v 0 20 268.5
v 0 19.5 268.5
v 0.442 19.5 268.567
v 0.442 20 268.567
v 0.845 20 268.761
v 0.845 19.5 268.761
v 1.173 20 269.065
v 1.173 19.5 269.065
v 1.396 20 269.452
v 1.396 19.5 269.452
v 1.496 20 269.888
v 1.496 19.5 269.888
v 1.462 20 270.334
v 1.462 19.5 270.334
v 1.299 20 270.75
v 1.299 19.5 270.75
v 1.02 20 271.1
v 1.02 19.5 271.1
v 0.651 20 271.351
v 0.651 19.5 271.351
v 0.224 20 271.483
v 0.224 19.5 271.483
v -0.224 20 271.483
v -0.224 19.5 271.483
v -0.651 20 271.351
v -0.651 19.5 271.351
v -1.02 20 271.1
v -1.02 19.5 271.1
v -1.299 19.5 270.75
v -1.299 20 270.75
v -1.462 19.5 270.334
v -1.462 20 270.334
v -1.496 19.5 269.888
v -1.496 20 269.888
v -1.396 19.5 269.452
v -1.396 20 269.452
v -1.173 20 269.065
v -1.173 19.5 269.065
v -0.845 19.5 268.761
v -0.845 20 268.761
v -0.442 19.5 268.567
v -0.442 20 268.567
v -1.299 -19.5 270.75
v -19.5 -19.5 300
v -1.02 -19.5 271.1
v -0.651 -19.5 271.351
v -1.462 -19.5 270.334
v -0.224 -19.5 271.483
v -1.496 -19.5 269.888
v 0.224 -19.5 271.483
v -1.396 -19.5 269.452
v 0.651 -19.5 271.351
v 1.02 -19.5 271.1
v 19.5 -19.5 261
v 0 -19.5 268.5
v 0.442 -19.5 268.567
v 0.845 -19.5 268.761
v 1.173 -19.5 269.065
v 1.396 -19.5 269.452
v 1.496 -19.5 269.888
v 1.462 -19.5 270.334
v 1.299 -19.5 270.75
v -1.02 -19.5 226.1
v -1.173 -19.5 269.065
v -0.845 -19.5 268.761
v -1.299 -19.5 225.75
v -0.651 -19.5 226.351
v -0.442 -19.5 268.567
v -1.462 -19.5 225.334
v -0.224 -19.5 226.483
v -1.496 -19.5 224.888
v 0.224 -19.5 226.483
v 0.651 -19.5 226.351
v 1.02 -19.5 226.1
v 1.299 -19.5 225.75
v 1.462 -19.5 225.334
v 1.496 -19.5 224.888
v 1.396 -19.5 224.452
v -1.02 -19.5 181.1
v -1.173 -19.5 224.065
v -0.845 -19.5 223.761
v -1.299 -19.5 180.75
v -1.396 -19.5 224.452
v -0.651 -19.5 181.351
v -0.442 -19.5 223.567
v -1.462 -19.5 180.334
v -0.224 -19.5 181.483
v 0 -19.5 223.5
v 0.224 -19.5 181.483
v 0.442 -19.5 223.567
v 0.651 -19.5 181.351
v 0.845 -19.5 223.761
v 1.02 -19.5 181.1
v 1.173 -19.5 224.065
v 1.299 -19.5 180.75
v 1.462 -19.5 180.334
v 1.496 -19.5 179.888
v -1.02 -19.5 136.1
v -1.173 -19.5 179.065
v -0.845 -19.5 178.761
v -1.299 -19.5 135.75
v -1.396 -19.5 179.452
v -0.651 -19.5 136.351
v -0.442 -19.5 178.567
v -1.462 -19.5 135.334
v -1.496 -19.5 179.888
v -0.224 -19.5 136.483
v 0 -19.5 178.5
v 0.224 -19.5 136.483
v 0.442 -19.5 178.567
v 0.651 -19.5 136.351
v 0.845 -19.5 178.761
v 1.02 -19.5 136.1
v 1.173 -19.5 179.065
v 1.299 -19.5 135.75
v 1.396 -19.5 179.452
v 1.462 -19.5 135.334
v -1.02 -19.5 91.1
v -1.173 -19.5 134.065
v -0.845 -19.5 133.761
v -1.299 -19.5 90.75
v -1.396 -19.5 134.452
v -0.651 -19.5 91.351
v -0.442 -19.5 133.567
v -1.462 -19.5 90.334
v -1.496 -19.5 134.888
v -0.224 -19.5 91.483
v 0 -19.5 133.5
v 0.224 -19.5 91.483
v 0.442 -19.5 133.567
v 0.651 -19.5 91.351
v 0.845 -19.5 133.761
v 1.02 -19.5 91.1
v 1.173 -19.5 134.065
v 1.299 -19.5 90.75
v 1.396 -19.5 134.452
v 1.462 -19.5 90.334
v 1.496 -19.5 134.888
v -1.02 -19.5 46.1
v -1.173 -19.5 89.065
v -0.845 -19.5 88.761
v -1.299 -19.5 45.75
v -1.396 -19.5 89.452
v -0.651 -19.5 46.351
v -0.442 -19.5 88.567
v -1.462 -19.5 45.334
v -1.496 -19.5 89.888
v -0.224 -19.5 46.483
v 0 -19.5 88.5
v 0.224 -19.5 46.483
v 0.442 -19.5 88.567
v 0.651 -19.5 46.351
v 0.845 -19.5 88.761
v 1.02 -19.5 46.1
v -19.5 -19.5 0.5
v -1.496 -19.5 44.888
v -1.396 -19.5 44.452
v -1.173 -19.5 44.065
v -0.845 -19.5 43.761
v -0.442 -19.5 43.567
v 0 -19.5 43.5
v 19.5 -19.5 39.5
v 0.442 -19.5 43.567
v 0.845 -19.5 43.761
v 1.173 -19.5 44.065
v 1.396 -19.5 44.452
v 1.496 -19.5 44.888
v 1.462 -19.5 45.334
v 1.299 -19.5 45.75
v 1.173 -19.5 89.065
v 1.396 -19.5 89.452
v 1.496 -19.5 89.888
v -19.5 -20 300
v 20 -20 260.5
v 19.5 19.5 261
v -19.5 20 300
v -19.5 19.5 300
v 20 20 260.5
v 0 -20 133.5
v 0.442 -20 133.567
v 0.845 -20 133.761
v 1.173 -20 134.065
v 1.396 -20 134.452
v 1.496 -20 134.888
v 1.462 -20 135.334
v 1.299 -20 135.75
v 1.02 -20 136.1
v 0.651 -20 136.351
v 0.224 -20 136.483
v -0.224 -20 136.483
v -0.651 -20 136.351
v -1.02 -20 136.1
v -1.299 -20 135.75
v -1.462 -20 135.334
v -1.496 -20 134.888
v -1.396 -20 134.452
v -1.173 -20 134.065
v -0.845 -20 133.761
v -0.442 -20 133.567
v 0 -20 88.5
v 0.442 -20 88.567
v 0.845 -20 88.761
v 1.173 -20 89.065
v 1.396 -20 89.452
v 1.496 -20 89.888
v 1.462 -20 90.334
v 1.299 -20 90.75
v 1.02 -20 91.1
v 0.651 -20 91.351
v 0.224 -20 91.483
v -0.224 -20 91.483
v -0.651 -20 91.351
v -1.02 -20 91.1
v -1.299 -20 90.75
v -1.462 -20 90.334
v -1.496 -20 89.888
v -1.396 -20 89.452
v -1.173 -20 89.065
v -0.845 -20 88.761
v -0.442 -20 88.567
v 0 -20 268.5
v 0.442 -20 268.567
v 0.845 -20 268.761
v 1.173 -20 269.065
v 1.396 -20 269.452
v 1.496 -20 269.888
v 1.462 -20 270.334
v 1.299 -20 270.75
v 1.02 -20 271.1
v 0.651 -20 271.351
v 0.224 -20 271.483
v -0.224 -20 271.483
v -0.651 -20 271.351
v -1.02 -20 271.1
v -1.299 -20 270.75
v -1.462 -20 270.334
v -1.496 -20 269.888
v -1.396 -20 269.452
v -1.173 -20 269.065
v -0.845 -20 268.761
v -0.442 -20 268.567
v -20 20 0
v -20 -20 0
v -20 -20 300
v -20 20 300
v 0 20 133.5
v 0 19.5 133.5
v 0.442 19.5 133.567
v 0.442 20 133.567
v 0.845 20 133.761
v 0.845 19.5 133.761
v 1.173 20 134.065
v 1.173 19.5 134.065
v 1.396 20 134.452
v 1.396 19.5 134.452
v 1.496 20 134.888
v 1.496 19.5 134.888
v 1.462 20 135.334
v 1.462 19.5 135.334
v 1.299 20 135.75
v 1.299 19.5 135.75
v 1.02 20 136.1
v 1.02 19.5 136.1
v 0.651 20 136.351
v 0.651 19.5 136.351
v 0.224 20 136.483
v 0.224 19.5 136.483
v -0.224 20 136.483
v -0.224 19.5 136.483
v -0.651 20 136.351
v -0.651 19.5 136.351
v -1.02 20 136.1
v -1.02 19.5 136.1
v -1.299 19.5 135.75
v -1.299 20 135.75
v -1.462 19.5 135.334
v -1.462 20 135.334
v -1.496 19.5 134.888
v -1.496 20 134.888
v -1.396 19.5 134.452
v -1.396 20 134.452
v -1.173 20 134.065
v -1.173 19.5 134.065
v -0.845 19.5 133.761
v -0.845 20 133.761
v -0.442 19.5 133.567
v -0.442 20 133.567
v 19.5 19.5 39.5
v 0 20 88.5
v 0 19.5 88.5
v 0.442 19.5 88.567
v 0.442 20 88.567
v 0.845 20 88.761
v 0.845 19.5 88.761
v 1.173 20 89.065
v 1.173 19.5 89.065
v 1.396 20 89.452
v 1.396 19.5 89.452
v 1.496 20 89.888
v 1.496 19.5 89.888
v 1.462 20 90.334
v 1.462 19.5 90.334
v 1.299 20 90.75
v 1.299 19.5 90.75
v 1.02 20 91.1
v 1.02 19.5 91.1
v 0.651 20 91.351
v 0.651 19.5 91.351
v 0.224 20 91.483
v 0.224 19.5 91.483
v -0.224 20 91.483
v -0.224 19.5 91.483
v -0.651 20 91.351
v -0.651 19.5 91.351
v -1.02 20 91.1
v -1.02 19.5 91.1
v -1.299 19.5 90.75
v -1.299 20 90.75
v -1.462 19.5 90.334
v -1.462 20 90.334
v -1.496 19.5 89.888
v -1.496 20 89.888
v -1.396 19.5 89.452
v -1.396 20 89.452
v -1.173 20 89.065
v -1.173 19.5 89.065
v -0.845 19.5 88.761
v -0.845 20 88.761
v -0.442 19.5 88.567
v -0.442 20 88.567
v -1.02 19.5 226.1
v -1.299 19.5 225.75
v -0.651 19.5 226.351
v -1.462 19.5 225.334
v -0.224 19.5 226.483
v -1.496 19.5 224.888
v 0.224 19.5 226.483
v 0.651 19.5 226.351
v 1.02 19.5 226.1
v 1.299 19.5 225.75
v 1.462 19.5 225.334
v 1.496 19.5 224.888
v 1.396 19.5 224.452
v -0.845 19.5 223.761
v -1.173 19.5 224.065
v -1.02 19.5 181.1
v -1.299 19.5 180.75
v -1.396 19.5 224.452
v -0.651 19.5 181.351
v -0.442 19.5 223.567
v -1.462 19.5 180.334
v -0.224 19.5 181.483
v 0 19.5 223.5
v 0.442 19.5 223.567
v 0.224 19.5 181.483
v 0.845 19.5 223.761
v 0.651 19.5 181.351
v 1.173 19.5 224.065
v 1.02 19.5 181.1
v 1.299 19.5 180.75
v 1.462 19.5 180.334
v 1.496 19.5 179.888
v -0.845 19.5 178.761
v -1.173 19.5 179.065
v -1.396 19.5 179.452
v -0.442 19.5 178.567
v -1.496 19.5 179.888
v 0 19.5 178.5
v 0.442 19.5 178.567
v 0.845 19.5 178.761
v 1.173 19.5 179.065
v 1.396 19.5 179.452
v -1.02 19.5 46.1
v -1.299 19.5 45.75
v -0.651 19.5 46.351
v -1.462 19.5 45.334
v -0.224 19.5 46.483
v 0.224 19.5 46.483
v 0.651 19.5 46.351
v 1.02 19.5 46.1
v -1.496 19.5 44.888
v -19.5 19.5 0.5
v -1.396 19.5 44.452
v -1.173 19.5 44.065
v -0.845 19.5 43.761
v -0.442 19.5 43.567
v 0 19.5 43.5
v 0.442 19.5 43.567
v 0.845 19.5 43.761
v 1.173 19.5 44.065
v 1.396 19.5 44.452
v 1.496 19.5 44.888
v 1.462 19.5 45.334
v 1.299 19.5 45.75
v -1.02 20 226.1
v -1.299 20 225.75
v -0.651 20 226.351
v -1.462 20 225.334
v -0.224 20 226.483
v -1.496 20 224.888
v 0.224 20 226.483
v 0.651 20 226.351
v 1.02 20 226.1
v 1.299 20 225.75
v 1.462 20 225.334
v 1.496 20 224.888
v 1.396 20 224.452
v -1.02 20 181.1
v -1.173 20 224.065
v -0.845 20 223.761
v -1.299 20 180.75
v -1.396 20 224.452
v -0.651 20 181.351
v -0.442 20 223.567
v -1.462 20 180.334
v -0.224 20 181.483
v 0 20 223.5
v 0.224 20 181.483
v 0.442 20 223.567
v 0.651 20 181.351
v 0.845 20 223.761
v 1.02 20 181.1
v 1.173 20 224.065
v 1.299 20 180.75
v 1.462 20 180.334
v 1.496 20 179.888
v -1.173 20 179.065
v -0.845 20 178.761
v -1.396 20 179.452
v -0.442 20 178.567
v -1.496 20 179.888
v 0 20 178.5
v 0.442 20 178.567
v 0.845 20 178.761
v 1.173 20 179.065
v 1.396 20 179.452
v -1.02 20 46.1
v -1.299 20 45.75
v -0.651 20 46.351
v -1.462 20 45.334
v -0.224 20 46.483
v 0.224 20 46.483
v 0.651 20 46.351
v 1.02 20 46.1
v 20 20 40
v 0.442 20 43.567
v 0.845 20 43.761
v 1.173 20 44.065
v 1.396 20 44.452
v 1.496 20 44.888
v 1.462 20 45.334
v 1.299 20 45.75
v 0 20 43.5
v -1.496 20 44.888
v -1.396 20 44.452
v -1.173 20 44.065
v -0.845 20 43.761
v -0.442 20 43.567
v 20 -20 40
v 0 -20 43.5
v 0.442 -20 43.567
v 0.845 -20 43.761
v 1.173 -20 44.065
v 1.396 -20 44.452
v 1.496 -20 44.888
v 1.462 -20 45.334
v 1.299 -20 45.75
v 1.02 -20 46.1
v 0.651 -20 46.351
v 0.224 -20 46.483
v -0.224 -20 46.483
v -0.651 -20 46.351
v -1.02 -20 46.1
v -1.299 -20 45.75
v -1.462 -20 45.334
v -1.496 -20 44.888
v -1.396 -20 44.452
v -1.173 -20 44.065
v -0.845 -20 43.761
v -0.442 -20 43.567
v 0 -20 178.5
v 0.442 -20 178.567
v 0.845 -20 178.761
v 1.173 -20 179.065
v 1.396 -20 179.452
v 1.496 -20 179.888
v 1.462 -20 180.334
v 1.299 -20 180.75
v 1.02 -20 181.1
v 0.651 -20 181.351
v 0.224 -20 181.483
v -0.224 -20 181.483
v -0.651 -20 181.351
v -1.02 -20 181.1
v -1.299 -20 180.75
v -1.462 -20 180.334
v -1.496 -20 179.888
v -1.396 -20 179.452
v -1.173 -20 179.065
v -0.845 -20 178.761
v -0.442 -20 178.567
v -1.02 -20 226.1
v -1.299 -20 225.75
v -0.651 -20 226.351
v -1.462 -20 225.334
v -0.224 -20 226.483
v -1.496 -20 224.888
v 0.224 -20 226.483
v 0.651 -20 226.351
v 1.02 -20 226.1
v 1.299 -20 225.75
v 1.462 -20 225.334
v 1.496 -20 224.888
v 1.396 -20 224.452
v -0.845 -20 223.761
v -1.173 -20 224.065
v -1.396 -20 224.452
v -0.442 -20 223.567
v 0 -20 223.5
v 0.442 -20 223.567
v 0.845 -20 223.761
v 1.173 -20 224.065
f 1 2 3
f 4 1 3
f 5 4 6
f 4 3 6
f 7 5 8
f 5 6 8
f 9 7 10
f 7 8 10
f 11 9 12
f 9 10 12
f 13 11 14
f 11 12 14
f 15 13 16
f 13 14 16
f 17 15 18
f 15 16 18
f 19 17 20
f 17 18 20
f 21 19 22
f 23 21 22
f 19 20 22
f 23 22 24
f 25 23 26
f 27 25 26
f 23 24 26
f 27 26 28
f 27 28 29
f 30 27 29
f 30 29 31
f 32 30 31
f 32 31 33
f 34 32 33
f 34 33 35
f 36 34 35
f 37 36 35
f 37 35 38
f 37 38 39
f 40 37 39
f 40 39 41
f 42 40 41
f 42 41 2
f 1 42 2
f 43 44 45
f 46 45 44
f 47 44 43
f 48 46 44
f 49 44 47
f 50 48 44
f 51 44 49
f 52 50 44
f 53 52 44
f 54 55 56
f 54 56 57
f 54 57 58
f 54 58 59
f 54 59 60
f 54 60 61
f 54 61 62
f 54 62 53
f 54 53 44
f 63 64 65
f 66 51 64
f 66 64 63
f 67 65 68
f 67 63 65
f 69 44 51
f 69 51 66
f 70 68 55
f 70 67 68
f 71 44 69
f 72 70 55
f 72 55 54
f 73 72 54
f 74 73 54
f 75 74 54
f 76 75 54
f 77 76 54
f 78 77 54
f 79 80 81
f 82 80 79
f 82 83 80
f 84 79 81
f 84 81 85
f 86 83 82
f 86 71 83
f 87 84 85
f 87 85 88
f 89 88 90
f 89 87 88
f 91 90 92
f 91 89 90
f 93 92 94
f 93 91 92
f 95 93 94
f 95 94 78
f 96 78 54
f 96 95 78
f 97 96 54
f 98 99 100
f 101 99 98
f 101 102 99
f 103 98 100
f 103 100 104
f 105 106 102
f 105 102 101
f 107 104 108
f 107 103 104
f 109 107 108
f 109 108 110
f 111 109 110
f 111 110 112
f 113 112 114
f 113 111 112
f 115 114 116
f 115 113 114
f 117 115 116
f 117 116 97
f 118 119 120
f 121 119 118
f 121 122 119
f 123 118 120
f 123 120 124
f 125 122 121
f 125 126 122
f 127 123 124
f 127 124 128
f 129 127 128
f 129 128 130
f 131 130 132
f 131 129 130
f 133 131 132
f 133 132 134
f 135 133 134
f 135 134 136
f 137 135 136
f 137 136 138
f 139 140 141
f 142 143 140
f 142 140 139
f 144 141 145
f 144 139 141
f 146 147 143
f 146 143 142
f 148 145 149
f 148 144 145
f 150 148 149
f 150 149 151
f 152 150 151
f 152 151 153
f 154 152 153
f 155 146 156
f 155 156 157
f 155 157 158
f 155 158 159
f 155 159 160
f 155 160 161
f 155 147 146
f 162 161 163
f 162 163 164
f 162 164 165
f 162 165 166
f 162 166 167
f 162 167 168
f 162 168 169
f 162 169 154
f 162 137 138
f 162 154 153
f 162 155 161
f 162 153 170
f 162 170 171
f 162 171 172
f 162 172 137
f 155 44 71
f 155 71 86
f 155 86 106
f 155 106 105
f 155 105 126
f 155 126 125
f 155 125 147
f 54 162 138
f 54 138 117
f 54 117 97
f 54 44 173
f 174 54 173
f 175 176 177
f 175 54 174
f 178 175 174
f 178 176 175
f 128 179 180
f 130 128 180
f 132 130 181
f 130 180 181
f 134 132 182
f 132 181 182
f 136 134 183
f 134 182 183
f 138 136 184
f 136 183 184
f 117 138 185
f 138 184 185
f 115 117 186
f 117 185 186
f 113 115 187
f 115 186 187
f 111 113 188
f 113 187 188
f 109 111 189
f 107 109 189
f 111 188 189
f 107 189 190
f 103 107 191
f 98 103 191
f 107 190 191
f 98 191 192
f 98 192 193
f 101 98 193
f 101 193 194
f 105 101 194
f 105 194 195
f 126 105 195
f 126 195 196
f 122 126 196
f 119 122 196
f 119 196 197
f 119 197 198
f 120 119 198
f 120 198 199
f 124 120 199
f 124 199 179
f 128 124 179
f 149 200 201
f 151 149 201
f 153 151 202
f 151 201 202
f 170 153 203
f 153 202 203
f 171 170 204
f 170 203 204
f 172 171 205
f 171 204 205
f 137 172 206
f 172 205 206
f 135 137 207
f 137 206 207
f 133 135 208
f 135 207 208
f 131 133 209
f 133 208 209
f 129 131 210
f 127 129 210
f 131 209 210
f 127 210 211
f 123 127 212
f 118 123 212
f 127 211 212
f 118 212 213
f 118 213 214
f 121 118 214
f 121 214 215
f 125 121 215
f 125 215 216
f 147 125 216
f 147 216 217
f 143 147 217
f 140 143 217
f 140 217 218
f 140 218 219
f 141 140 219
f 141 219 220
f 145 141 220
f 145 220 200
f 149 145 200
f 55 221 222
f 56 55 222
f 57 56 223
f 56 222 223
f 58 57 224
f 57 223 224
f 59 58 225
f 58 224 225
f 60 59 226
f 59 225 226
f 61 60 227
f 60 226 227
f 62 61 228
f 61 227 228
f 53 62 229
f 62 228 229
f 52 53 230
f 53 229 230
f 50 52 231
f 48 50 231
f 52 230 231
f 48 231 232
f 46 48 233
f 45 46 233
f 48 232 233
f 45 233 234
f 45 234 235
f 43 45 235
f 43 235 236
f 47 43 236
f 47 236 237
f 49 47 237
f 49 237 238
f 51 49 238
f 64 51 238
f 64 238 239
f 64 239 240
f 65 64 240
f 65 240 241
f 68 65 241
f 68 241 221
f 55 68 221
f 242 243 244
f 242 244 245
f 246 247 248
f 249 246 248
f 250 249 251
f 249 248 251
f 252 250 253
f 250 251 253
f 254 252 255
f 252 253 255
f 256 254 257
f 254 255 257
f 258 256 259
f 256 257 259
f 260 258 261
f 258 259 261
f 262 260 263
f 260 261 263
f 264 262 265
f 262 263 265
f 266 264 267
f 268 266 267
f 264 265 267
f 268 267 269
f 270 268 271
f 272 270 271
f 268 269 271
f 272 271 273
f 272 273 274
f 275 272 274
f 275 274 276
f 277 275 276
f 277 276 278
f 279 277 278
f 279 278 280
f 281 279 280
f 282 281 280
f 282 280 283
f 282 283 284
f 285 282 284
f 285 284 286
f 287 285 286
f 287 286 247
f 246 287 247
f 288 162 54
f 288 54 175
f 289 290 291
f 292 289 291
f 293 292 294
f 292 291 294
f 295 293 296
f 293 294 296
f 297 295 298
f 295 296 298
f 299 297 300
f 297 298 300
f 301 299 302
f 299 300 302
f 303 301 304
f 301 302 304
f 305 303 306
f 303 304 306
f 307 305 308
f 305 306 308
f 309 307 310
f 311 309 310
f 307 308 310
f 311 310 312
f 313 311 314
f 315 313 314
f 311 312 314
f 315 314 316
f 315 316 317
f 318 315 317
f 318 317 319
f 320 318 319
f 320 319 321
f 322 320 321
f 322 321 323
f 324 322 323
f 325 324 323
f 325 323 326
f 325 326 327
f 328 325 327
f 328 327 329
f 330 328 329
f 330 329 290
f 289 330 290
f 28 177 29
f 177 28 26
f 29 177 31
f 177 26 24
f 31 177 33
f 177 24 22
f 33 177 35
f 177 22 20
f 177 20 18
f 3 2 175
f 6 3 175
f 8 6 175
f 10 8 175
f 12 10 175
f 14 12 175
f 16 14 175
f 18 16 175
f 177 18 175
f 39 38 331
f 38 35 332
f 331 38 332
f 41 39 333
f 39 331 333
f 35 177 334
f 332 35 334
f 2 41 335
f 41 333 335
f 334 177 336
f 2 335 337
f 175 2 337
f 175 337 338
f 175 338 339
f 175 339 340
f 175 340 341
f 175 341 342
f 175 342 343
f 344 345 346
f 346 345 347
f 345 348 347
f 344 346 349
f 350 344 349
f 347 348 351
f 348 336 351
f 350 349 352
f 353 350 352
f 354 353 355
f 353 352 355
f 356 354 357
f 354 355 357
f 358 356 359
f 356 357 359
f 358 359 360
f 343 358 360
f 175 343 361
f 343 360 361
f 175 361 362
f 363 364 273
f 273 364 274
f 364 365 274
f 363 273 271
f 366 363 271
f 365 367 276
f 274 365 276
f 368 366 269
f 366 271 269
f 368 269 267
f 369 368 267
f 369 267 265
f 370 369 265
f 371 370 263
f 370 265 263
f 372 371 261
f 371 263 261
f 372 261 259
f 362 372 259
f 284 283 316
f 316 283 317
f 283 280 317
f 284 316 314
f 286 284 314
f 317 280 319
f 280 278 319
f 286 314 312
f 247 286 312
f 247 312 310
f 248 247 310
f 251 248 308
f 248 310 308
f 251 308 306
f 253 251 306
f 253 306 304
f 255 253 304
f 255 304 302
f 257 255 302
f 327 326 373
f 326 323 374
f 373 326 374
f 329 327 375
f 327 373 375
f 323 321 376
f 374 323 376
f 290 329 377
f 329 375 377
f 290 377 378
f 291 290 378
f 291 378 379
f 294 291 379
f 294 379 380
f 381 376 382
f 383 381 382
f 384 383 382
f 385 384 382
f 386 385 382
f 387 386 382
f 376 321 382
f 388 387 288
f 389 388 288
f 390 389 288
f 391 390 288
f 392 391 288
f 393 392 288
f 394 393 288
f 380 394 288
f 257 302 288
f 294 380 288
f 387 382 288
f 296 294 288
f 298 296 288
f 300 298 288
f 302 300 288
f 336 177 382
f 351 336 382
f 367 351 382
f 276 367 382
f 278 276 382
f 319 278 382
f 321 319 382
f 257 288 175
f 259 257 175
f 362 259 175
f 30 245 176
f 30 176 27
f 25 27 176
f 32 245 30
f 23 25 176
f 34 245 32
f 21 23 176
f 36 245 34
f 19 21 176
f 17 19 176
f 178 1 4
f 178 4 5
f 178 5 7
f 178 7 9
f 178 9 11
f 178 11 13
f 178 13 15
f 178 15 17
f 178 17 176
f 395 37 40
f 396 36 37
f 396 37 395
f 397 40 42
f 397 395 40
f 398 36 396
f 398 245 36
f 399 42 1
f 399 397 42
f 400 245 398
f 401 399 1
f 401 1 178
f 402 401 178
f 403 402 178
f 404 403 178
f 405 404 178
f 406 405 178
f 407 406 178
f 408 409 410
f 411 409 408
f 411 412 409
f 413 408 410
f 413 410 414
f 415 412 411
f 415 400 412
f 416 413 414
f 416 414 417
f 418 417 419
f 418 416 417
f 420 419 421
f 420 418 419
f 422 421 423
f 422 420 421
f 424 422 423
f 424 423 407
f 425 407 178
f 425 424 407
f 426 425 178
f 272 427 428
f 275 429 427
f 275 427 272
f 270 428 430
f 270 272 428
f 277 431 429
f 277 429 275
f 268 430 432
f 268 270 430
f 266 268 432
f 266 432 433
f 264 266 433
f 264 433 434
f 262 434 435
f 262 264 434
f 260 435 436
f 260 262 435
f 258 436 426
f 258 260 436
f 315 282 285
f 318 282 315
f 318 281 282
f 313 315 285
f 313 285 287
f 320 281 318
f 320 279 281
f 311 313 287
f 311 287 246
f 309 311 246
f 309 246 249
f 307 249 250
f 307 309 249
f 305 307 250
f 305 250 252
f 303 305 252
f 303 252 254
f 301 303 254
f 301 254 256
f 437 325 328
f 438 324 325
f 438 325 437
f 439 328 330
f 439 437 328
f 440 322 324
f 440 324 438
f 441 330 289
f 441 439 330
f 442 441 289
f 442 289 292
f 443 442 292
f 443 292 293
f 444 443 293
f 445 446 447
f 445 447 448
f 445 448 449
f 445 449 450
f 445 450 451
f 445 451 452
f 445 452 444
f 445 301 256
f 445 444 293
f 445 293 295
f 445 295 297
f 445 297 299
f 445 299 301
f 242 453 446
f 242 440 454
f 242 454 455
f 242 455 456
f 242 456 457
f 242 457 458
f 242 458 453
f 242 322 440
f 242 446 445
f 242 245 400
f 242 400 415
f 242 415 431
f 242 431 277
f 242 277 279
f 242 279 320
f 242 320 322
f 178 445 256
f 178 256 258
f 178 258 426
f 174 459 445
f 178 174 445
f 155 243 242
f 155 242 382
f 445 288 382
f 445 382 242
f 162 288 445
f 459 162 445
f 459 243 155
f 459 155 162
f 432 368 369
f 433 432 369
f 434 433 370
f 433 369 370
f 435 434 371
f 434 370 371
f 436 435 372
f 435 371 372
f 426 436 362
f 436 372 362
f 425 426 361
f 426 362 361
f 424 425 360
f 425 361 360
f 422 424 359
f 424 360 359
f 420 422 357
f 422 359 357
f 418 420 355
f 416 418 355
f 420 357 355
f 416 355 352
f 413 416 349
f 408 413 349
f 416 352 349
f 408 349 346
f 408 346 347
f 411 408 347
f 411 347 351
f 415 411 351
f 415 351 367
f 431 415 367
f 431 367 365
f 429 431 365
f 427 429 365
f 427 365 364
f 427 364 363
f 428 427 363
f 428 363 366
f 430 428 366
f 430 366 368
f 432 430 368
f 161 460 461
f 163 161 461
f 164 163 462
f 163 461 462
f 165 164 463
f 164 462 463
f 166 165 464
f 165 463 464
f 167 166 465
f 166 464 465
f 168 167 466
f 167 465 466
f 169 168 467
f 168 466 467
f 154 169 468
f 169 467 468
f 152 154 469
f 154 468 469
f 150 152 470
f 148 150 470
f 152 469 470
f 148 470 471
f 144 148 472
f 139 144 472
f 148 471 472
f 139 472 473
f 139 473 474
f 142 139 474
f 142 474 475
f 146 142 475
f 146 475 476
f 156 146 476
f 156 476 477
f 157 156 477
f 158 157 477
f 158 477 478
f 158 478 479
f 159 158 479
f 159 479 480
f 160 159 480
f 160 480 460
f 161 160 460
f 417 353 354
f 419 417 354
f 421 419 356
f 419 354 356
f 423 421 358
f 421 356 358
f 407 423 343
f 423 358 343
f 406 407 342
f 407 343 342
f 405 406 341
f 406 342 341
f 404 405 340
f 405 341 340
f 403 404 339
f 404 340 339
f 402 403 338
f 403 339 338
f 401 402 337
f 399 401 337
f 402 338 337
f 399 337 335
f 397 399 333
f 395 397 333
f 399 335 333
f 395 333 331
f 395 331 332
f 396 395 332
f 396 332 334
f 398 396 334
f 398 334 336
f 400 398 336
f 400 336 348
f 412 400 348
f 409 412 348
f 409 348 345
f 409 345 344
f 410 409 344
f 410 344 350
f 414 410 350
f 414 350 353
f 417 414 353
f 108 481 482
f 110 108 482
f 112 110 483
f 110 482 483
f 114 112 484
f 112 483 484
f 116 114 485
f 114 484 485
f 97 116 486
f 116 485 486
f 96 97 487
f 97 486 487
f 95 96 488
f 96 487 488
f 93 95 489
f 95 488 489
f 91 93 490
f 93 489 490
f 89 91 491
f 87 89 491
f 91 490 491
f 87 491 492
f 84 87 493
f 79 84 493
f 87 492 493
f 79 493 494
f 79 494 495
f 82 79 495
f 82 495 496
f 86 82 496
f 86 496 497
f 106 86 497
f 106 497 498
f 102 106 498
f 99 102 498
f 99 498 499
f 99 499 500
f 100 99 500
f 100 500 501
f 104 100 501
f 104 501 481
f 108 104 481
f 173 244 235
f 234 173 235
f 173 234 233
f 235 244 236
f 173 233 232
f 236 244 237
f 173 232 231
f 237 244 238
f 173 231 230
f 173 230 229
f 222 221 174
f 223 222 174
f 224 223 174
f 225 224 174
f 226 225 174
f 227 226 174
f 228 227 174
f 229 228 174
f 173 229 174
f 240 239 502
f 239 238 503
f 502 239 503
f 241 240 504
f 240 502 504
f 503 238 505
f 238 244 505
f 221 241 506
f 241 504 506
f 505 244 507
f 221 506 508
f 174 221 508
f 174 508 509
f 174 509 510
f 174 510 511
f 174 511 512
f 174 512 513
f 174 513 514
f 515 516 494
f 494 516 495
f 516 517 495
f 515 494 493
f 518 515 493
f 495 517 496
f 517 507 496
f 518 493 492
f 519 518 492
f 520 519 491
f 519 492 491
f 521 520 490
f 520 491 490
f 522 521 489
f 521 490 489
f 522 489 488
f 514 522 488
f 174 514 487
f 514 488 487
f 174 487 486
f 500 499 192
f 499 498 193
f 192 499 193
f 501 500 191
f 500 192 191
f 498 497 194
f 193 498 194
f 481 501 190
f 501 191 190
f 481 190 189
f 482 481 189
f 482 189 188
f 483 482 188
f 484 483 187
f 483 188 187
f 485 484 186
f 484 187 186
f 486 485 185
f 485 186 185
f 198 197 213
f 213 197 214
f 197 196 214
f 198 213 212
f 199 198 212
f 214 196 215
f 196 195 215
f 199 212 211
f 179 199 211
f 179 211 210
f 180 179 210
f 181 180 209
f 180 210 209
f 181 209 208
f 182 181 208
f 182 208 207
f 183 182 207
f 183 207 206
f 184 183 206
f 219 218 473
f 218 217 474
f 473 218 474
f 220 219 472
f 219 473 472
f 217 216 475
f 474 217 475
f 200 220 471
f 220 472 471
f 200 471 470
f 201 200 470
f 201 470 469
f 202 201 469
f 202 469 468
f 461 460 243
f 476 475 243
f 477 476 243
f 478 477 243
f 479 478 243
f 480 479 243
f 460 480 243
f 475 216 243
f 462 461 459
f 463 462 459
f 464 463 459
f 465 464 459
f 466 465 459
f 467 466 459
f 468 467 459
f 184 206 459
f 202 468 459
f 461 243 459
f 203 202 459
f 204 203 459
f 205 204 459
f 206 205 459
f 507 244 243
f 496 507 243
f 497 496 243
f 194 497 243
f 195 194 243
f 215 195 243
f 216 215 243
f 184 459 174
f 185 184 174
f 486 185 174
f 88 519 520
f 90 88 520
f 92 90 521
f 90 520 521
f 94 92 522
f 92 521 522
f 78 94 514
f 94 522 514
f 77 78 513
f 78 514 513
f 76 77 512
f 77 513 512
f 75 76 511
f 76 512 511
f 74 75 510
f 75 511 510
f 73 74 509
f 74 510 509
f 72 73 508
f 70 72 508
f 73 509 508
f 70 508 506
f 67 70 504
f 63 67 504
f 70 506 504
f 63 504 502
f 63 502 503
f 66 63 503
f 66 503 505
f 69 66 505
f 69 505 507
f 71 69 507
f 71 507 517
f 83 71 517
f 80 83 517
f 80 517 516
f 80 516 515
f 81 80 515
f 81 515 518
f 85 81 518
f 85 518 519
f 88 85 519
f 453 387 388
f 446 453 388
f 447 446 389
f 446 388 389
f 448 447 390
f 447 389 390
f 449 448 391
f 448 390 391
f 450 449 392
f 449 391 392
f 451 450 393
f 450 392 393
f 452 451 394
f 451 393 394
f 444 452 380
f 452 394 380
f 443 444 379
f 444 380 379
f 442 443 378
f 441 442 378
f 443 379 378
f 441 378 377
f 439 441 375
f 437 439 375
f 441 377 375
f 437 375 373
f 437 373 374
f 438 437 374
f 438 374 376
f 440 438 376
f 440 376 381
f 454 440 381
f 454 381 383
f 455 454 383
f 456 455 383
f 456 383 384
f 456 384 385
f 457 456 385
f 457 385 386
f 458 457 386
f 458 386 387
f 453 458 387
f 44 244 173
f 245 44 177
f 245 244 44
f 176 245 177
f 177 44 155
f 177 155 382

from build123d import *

# Parameters (mm, degrees)
CROQUIS1_W              = 40
CROQUIS1_H              = 40
CROQUIS1_W_2            = 39
CROQUIS1_H_2            = 39
SALIENTE_EXTRUIR2_DEPTH = 300
CORTAR_EXTRUIR1_DEPTH   = 300
CORTAR_EXTRUIR2_DEPTH   = 300
CROQUIS4_R              = 1.5
CORTAR_EXTRUIR3_DEPTH   = 550


with BuildPart() as part:
    # Croquis1 → Saliente-Extruir2 (new body)
    with BuildSketch(Plane.XY):
        Rectangle(CROQUIS1_W, CROQUIS1_H)
        Rectangle(CROQUIS1_W_2, CROQUIS1_H_2, mode=Mode.SUBTRACT)
    extrude(amount=SALIENTE_EXTRUIR2_DEPTH)

    # Croquis2 → Cortar-Extruir1 (cut)
    with BuildSketch(Plane(origin=(0, 20, 0), x_dir=(1, 0, 0), z_dir=(0, 1, 0))):
        Polygon((-19.5, -300), (20, -260.5), (20, -300), align=None)
    extrude(amount=-CORTAR_EXTRUIR1_DEPTH, mode=Mode.SUBTRACT)

    # Croquis3 → Cortar-Extruir2 (cut)
    with BuildSketch(Plane.XZ.offset(20)):
        Polygon((-20, 0), (20, 40), (20, 0), align=None)
    extrude(amount=-CORTAR_EXTRUIR2_DEPTH, mode=Mode.SUBTRACT)

    # Croquis4 → Cortar-Extruir3 (cut)
    with BuildSketch(Plane.XZ.offset(20)):
        with Locations(Location((0, 45, 0), (0, 0, 270))):
            Circle(CROQUIS4_R)
        with Locations(Location((0, 90, 0), (0, 0, 270))):
            Circle(CROQUIS4_R)
        with Locations(Location((0, 135, 0), (0, 0, 270))):
            Circle(CROQUIS4_R)
        with Locations(Location((0, 180, 0), (0, 0, 270))):
            Circle(CROQUIS4_R)
        with Locations(Location((0, 225, 0), (0, 0, 270))):
            Circle(CROQUIS4_R)
        with Locations(Location((0, 270, 0), (0, 0, 270))):
            Circle(CROQUIS4_R)
    extrude(amount=-CORTAR_EXTRUIR3_DEPTH, mode=Mode.SUBTRACT)


solid = part.part
